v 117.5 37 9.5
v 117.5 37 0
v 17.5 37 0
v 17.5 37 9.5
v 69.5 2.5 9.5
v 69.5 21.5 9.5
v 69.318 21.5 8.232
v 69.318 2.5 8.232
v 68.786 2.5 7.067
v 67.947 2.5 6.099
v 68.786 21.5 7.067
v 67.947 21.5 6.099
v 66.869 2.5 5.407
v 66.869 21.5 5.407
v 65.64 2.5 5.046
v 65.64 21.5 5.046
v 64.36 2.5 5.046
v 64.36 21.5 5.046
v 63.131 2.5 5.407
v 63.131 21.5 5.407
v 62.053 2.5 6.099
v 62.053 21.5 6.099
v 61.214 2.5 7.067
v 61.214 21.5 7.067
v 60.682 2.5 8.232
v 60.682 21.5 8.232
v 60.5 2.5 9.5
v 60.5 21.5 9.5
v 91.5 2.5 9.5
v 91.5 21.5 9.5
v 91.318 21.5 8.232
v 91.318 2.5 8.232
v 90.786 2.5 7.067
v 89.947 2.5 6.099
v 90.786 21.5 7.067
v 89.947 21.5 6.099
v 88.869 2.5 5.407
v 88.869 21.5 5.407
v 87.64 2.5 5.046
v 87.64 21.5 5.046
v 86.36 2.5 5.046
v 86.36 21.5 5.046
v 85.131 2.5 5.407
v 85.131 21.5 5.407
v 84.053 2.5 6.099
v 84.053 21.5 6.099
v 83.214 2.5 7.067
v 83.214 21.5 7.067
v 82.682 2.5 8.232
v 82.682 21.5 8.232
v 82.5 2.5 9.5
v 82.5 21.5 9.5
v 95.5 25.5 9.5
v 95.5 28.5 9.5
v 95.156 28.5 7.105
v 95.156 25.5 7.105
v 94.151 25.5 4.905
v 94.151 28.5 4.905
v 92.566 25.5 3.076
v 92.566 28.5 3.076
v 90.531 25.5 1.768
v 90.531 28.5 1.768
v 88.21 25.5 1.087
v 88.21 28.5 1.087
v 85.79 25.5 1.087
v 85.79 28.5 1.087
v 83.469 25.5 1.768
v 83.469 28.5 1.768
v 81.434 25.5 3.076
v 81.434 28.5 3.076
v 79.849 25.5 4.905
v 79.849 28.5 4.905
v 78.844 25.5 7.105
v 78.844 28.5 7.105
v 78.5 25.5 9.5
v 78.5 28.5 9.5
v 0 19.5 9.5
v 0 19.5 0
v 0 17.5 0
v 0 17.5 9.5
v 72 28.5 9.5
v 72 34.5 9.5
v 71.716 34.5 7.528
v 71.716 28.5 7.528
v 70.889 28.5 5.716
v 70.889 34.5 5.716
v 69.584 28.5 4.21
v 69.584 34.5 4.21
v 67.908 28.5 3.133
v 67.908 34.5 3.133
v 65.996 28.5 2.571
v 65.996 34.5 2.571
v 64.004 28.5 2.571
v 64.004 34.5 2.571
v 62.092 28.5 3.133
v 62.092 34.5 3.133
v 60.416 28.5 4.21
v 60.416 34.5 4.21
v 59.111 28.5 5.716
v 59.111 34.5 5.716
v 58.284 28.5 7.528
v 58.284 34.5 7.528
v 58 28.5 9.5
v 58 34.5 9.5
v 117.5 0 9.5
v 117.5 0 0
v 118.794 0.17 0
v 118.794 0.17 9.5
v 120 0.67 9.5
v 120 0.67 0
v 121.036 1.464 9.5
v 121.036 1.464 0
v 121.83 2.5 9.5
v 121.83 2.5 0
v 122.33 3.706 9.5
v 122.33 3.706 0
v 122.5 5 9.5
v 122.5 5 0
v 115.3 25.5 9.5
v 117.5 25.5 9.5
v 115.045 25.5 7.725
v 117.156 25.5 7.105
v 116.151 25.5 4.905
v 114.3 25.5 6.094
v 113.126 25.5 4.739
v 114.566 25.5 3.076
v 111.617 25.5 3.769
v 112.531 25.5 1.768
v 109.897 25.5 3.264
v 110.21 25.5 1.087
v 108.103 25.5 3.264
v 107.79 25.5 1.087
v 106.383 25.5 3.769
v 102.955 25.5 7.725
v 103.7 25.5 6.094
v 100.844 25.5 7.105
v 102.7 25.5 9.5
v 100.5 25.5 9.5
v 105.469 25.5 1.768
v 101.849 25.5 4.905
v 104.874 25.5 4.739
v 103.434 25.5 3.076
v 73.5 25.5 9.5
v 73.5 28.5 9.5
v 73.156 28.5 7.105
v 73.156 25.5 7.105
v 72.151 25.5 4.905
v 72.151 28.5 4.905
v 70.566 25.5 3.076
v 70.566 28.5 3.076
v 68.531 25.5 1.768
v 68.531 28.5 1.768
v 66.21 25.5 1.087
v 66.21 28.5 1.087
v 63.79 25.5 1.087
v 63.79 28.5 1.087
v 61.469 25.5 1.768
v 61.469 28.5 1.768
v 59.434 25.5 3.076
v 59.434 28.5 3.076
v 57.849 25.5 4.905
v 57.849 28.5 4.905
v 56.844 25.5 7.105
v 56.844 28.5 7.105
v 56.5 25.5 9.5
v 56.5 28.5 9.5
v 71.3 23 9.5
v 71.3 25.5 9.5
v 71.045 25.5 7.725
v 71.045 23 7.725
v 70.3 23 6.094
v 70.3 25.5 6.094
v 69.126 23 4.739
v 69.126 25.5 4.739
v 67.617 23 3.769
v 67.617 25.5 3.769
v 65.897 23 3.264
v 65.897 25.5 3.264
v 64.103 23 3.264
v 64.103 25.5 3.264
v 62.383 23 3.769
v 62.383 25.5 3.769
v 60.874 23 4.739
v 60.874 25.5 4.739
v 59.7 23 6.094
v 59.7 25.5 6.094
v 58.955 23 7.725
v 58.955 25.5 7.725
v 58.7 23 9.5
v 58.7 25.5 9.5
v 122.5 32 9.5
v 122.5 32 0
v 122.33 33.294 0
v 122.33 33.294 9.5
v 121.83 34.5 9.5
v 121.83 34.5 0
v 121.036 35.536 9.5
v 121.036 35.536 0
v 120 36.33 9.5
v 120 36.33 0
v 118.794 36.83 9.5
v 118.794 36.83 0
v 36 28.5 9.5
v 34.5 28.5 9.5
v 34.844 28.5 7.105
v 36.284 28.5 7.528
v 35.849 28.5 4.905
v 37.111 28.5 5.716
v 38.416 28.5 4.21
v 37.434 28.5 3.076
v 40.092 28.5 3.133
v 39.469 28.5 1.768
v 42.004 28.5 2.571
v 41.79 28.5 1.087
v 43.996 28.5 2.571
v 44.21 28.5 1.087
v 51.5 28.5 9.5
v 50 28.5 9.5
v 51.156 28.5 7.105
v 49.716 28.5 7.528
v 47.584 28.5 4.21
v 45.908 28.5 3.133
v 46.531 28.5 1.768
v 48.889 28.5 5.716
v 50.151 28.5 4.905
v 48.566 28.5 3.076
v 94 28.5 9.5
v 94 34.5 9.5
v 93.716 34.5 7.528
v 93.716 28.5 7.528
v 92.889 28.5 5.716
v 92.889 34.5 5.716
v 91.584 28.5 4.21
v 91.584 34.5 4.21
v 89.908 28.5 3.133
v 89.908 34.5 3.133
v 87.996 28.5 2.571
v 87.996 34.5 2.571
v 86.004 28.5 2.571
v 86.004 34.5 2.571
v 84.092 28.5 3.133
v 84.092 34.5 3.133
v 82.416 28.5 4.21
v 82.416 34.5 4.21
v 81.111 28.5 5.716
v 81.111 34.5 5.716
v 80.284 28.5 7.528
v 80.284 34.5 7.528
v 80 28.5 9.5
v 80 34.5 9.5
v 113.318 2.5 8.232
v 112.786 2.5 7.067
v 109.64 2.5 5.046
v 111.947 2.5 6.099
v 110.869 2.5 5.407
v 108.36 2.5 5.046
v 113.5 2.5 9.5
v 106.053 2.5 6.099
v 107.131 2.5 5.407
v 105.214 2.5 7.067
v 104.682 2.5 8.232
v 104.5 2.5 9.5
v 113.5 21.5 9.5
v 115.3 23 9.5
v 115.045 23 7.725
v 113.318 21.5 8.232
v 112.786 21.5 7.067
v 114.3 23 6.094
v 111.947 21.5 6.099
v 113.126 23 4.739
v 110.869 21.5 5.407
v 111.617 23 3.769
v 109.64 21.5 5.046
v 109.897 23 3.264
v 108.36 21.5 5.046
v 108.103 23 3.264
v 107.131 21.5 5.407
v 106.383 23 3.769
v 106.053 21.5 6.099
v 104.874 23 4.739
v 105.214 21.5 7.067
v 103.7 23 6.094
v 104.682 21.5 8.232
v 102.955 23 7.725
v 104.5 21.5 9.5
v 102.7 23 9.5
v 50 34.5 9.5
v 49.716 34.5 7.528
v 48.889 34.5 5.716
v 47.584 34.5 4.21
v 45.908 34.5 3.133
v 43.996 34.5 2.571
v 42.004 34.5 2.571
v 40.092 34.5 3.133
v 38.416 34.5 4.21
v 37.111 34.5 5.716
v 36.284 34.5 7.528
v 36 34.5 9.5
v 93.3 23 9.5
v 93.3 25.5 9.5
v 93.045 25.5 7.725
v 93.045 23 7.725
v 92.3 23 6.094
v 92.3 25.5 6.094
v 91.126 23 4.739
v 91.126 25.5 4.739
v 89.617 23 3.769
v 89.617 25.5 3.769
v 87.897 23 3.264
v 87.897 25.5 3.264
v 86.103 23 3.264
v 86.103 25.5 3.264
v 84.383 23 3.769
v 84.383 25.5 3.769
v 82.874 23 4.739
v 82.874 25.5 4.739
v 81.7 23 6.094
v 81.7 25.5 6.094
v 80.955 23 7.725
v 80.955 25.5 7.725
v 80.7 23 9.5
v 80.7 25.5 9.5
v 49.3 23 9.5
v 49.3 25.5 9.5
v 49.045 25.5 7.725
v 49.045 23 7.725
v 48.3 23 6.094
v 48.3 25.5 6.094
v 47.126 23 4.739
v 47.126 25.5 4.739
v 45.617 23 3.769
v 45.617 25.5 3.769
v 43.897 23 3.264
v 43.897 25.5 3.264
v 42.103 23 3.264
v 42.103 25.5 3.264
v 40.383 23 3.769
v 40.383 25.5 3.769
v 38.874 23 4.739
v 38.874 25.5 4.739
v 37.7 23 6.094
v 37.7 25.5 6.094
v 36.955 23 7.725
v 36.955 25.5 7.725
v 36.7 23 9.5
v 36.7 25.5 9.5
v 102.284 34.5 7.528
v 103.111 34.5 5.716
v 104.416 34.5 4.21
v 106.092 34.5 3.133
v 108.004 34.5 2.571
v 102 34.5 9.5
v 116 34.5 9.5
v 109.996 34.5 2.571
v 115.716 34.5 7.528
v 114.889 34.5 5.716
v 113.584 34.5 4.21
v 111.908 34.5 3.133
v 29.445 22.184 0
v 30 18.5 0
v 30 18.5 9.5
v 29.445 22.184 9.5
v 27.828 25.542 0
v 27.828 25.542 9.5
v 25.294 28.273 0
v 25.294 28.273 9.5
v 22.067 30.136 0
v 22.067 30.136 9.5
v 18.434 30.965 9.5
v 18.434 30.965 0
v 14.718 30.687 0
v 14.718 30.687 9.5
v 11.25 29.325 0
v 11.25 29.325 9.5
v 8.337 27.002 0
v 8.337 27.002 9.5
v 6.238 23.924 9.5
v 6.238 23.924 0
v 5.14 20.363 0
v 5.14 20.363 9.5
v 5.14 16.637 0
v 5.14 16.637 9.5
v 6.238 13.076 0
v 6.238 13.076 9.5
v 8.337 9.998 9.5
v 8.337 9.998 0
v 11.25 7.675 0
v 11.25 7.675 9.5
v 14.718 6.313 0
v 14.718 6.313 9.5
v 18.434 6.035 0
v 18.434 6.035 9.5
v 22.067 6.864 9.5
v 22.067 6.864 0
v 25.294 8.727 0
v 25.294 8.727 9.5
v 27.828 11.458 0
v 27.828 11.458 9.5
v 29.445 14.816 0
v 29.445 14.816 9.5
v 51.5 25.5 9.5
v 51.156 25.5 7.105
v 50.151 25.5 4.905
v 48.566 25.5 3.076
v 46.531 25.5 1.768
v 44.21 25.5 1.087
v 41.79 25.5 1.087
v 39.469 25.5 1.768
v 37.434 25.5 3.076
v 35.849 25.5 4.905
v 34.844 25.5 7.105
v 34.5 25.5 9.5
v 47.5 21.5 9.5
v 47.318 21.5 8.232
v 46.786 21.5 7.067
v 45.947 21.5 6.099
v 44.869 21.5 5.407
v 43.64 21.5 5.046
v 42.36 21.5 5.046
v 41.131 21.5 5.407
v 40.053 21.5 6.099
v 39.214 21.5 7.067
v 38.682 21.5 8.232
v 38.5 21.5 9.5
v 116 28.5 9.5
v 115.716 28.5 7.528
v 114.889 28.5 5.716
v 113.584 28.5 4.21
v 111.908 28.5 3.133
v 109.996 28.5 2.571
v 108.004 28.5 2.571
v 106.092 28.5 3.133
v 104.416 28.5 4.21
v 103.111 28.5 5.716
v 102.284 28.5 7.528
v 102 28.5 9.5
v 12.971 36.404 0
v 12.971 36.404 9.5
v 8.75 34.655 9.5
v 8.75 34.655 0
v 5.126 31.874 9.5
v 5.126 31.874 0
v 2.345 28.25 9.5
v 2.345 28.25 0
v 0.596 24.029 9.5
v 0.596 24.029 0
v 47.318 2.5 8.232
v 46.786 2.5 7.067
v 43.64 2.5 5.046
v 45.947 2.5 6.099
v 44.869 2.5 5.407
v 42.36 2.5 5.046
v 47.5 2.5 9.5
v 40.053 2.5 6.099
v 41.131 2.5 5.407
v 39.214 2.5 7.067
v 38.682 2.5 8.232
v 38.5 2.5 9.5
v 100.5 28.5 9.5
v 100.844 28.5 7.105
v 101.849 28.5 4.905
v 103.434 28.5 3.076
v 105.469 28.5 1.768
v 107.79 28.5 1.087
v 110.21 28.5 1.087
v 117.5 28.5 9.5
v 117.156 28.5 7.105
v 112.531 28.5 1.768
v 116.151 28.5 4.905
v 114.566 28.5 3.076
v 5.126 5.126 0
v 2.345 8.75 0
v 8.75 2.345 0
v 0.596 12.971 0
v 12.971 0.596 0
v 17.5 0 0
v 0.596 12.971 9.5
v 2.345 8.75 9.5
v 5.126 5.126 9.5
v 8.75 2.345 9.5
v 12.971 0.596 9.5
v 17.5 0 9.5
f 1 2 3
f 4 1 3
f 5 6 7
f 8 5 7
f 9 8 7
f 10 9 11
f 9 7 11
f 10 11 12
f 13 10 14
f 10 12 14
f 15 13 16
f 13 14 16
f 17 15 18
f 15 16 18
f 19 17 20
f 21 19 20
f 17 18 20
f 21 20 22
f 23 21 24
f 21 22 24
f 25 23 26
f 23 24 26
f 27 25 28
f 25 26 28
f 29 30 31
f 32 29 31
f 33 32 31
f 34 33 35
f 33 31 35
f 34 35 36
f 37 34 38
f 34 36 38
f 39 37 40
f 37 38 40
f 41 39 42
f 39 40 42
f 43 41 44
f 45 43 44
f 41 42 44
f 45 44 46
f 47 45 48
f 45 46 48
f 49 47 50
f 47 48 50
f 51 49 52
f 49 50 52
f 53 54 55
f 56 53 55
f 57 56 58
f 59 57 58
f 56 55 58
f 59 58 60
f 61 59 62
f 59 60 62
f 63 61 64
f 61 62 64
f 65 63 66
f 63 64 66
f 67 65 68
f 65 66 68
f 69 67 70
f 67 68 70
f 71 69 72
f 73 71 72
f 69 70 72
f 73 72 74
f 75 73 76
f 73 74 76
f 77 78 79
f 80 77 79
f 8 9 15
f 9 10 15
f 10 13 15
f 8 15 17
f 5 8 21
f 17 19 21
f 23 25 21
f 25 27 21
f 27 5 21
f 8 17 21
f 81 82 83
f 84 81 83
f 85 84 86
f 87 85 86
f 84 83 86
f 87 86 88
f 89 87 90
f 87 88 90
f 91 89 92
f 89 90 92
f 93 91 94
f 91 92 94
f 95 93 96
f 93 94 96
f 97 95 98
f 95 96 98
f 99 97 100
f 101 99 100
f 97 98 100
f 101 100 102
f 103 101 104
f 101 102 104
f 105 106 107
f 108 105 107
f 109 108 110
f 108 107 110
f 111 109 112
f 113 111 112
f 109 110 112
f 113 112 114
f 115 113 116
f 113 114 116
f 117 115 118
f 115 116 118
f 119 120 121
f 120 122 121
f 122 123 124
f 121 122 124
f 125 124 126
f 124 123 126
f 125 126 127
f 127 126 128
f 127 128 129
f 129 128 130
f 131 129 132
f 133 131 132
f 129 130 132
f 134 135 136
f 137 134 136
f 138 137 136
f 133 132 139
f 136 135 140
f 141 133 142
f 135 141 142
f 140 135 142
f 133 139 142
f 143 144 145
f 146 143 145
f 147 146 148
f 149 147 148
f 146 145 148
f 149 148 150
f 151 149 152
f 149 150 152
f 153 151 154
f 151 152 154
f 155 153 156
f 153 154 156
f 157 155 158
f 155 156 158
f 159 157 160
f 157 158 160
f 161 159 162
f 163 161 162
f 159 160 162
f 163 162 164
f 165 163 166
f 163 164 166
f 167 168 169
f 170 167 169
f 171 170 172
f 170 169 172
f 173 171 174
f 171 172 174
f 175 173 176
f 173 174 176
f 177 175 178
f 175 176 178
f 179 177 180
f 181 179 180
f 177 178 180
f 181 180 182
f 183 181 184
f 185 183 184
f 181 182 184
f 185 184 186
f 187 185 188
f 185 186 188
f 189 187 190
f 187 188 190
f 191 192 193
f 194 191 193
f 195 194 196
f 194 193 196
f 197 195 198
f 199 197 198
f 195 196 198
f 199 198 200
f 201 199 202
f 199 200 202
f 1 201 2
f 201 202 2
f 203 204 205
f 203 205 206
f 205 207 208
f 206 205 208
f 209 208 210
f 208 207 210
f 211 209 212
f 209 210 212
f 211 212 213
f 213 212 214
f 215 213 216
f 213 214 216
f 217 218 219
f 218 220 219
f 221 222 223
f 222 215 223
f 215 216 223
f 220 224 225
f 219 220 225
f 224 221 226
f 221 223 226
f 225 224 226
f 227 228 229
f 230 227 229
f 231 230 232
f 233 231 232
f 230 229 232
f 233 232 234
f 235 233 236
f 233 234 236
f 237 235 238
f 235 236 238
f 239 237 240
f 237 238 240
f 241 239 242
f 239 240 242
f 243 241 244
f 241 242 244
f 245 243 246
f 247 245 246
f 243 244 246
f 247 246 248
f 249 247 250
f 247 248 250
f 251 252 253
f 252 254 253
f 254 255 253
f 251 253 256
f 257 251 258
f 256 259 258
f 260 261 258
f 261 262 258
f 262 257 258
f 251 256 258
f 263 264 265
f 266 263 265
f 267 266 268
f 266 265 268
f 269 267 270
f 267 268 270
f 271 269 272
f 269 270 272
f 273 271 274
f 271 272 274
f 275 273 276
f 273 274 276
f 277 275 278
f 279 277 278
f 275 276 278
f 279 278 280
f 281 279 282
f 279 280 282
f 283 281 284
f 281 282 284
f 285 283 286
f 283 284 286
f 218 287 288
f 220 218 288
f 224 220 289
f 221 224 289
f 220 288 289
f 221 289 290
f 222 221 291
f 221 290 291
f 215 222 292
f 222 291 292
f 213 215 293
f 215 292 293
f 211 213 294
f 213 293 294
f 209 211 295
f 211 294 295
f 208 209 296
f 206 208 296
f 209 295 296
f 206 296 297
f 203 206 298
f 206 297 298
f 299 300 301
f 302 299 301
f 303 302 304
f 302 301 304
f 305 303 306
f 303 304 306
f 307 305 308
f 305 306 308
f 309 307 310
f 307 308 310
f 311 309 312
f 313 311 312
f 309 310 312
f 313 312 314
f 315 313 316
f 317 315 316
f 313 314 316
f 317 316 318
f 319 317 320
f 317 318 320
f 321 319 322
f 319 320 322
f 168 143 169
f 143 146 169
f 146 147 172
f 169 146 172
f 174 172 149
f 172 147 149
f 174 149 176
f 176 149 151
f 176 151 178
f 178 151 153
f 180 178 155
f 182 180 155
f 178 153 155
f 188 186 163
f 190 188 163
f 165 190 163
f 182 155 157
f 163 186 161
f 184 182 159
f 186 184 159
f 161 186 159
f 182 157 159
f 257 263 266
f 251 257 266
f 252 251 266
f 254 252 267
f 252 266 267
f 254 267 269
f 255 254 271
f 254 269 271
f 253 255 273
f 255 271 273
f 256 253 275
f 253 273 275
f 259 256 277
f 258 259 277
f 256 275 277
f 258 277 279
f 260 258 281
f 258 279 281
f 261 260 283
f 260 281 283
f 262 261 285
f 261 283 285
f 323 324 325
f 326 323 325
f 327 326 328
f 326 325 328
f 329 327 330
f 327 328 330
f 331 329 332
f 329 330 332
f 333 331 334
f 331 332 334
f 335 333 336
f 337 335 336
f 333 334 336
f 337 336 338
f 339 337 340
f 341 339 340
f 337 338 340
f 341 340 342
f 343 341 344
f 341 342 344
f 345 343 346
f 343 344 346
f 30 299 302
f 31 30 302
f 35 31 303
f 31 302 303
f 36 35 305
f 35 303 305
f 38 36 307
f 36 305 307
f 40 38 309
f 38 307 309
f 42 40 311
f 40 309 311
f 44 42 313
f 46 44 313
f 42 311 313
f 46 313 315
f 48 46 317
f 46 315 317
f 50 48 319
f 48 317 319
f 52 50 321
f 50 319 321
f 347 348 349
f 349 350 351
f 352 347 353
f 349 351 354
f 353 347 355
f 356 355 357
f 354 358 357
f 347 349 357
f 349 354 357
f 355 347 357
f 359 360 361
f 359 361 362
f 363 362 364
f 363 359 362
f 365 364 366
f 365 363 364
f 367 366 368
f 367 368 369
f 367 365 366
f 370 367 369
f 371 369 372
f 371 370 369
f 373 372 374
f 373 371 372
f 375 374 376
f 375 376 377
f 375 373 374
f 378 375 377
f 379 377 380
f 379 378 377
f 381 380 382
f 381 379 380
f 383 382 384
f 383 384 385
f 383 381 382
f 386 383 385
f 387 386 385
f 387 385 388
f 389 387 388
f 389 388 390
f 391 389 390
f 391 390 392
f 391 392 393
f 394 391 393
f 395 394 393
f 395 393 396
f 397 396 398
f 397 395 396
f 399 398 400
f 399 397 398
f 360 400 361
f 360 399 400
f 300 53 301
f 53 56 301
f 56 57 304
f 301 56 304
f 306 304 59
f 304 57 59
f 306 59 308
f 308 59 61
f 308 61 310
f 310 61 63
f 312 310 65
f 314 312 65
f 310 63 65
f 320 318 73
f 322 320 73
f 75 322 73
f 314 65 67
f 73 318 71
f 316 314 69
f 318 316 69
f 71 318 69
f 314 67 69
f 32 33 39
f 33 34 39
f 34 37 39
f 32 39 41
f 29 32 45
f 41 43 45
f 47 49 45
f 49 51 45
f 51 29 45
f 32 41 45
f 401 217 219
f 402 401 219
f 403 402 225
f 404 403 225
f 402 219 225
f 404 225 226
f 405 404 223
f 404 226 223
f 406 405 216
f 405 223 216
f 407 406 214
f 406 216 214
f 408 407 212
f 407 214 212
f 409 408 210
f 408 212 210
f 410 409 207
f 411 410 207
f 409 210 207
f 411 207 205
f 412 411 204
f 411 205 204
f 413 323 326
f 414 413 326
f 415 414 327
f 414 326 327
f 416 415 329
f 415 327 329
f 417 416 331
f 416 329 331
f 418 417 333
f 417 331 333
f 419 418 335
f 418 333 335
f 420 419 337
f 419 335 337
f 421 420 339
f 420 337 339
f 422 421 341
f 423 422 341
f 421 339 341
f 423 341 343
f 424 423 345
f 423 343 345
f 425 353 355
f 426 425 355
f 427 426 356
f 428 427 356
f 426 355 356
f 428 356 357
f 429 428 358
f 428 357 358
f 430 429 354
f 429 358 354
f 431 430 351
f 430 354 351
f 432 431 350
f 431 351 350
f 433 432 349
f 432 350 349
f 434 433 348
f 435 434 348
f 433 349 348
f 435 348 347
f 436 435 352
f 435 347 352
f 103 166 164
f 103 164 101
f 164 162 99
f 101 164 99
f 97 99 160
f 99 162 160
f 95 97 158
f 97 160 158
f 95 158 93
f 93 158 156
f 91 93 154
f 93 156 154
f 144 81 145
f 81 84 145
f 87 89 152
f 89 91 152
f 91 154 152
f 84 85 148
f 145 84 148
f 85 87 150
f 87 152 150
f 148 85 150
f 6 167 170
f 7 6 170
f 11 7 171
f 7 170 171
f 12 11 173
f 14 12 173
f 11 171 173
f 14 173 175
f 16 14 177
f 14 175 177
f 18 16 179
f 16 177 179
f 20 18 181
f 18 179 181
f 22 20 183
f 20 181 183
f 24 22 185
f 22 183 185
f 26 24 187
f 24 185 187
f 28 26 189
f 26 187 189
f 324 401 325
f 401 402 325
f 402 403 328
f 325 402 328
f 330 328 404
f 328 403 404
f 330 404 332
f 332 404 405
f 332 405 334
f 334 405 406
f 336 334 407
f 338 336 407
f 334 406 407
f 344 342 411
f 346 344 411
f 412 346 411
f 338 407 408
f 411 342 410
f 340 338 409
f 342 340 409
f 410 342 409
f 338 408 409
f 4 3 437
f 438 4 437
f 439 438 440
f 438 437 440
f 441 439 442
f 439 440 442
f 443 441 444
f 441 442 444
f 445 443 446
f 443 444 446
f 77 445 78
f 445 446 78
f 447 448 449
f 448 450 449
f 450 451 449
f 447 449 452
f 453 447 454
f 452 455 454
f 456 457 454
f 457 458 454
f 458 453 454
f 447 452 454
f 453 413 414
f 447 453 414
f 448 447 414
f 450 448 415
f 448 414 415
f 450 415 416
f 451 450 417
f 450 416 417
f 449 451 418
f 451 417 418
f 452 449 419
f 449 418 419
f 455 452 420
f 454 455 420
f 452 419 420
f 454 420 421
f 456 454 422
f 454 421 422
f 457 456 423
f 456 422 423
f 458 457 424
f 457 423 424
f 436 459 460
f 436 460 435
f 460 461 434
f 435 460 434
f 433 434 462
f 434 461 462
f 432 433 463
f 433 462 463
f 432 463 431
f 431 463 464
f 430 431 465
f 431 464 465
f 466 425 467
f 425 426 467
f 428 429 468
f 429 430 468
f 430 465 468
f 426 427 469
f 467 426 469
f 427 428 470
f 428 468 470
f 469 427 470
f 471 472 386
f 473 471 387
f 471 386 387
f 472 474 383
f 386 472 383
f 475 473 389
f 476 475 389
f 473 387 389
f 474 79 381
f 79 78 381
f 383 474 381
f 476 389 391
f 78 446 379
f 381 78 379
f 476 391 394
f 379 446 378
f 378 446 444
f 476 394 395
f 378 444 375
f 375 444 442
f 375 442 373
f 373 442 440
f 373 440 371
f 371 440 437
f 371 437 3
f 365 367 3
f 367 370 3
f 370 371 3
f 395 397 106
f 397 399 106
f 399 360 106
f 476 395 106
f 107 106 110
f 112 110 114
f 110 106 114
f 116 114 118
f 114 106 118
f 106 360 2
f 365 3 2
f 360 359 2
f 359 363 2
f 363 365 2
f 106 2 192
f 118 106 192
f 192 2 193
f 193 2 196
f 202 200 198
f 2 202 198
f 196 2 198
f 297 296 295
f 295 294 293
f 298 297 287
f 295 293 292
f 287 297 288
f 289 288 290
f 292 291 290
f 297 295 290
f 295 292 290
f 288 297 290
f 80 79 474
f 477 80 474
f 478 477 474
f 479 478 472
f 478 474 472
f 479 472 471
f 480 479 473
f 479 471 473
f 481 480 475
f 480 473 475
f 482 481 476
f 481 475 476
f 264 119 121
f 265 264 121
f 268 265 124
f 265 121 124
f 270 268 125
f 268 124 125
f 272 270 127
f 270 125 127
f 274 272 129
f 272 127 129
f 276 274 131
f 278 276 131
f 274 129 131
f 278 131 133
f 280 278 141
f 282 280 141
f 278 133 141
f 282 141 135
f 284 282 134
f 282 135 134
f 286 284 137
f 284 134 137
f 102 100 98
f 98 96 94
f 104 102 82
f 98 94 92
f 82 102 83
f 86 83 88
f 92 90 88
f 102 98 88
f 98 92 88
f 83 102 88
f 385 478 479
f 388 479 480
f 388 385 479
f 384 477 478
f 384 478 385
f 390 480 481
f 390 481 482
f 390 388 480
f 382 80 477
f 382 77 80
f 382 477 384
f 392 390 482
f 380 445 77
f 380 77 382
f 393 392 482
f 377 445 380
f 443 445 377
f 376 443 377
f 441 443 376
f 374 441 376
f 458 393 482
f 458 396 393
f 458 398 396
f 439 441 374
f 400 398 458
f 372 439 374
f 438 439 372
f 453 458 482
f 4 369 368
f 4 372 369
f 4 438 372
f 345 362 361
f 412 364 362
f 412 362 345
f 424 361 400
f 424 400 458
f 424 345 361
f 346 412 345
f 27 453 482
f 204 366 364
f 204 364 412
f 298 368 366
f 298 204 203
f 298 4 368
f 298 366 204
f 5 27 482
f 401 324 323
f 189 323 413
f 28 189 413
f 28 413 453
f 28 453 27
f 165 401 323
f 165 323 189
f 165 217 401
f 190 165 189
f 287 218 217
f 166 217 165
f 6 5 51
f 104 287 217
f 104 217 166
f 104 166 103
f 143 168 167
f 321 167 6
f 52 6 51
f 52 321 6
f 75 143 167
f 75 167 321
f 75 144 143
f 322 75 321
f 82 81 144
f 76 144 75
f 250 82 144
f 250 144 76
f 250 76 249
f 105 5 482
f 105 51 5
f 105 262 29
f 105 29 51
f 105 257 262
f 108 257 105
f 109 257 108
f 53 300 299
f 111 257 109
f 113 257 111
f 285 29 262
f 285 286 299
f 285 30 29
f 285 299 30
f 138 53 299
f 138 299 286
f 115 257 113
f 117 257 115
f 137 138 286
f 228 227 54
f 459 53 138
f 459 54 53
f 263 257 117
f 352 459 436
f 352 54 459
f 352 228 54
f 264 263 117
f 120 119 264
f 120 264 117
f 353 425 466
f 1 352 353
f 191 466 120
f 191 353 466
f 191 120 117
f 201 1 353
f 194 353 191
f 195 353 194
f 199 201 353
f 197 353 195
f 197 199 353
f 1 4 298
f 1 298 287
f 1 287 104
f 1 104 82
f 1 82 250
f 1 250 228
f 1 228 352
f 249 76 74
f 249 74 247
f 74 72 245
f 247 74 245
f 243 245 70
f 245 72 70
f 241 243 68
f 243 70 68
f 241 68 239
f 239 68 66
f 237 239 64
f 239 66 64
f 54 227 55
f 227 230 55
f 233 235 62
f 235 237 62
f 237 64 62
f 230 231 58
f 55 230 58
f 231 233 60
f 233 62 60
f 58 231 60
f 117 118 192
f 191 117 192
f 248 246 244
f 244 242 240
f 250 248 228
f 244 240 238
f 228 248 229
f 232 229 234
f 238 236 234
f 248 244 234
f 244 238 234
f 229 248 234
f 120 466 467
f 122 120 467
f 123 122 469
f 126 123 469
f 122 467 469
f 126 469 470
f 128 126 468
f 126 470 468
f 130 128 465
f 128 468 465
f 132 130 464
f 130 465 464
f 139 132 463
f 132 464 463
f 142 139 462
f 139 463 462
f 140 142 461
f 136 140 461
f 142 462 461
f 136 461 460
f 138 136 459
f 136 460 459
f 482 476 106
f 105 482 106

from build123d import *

# Parameters (mm, degrees)
F0_R     = 12.5
F1_DEPTH = 9.5


with BuildPart() as f1:
    # F0 (on Top) → F1 (new body)
    with BuildSketch(Plane.XY):
        with BuildLine():
            ThreePointArc((0, 17.5), (5.125631, 5.125631), (17.5, 0))
            Line((17.5, 0), (117.5, 0))
            ThreePointArc((117.5, 0), (121.035534, 1.464466), (122.5, 5))
            Line((122.5, 5), (122.5, 32))
            ThreePointArc((122.5, 32), (121.035534, 35.535534), (117.5, 37))
            Line((117.5, 37), (17.5, 37))
            ThreePointArc((17.5, 37), (5.125631, 31.874369), (0, 19.5))
            Line((0, 19.5), (0, 17.5))
        make_face()
        with Locations((17.5, 18.5)):
            Circle(F0_R, mode=Mode.SUBTRACT)
    extrude(amount=F1_DEPTH)

    # F2 (on face) → F3 (revolve, cut)
    with BuildSketch(Plane.XY.offset(9.5)):
        Polygon((109, 21.5), (109, 2.5), (113.5, 2.5), (113.5, 21.5), (115.3, 23), (115.3, 25.5), (117.5, 25.5), (117.5, 28.5), (116, 28.5), (116, 34.5), (109, 34.5), (109, 28.5), (109, 25.5), (109, 23), align=None)
    revolve(axis=Axis((109, 12, 9.5), (0, 1, 0)), mode=Mode.SUBTRACT)

    # F2 (on face) → F4 (revolve, cut)
    with BuildSketch(Plane.XY.offset(9.5)):
        Polygon((87, 21.5), (87, 2.5), (91.5, 2.5), (91.5, 21.5), (93.3, 23), (93.3, 25.5), (95.5, 25.5), (95.5, 28.5), (94, 28.5), (94, 34.5), (87, 34.5), (87, 28.5), (87, 25.5), (87, 23), align=None)
    revolve(axis=Axis((87, 12, 9.5), (0, 1, 0)), mode=Mode.SUBTRACT)

    # F2 (on face) → F5 (revolve, cut)
    with BuildSketch(Plane.XY.offset(9.5)):
        Polygon((65, 21.5), (65, 2.5), (69.5, 2.5), (69.5, 21.5), (71.3, 23), (71.3, 25.5), (73.5, 25.5), (73.5, 28.5), (72, 28.5), (72, 34.5), (65, 34.5), (65, 28.5), (65, 25.5), (65, 23), align=None)
    revolve(axis=Axis((65, 12, 9.5), (0, 1, 0)), mode=Mode.SUBTRACT)

    # F2 (on face) → F6 (revolve, cut)
    with BuildSketch(Plane.XY.offset(9.5)):
        Polygon((43, 21.5), (43, 2.5), (47.5, 2.5), (47.5, 21.5), (49.3, 23), (49.3, 25.5), (51.5, 25.5), (51.5, 28.5), (50, 28.5), (50, 34.5), (43, 34.5), (43, 28.5), (43, 25.5), (43, 23), align=None)
    revolve(axis=Axis((43, 12, 9.5), (0, 1, 0)), mode=Mode.SUBTRACT)


solid = f1.part
